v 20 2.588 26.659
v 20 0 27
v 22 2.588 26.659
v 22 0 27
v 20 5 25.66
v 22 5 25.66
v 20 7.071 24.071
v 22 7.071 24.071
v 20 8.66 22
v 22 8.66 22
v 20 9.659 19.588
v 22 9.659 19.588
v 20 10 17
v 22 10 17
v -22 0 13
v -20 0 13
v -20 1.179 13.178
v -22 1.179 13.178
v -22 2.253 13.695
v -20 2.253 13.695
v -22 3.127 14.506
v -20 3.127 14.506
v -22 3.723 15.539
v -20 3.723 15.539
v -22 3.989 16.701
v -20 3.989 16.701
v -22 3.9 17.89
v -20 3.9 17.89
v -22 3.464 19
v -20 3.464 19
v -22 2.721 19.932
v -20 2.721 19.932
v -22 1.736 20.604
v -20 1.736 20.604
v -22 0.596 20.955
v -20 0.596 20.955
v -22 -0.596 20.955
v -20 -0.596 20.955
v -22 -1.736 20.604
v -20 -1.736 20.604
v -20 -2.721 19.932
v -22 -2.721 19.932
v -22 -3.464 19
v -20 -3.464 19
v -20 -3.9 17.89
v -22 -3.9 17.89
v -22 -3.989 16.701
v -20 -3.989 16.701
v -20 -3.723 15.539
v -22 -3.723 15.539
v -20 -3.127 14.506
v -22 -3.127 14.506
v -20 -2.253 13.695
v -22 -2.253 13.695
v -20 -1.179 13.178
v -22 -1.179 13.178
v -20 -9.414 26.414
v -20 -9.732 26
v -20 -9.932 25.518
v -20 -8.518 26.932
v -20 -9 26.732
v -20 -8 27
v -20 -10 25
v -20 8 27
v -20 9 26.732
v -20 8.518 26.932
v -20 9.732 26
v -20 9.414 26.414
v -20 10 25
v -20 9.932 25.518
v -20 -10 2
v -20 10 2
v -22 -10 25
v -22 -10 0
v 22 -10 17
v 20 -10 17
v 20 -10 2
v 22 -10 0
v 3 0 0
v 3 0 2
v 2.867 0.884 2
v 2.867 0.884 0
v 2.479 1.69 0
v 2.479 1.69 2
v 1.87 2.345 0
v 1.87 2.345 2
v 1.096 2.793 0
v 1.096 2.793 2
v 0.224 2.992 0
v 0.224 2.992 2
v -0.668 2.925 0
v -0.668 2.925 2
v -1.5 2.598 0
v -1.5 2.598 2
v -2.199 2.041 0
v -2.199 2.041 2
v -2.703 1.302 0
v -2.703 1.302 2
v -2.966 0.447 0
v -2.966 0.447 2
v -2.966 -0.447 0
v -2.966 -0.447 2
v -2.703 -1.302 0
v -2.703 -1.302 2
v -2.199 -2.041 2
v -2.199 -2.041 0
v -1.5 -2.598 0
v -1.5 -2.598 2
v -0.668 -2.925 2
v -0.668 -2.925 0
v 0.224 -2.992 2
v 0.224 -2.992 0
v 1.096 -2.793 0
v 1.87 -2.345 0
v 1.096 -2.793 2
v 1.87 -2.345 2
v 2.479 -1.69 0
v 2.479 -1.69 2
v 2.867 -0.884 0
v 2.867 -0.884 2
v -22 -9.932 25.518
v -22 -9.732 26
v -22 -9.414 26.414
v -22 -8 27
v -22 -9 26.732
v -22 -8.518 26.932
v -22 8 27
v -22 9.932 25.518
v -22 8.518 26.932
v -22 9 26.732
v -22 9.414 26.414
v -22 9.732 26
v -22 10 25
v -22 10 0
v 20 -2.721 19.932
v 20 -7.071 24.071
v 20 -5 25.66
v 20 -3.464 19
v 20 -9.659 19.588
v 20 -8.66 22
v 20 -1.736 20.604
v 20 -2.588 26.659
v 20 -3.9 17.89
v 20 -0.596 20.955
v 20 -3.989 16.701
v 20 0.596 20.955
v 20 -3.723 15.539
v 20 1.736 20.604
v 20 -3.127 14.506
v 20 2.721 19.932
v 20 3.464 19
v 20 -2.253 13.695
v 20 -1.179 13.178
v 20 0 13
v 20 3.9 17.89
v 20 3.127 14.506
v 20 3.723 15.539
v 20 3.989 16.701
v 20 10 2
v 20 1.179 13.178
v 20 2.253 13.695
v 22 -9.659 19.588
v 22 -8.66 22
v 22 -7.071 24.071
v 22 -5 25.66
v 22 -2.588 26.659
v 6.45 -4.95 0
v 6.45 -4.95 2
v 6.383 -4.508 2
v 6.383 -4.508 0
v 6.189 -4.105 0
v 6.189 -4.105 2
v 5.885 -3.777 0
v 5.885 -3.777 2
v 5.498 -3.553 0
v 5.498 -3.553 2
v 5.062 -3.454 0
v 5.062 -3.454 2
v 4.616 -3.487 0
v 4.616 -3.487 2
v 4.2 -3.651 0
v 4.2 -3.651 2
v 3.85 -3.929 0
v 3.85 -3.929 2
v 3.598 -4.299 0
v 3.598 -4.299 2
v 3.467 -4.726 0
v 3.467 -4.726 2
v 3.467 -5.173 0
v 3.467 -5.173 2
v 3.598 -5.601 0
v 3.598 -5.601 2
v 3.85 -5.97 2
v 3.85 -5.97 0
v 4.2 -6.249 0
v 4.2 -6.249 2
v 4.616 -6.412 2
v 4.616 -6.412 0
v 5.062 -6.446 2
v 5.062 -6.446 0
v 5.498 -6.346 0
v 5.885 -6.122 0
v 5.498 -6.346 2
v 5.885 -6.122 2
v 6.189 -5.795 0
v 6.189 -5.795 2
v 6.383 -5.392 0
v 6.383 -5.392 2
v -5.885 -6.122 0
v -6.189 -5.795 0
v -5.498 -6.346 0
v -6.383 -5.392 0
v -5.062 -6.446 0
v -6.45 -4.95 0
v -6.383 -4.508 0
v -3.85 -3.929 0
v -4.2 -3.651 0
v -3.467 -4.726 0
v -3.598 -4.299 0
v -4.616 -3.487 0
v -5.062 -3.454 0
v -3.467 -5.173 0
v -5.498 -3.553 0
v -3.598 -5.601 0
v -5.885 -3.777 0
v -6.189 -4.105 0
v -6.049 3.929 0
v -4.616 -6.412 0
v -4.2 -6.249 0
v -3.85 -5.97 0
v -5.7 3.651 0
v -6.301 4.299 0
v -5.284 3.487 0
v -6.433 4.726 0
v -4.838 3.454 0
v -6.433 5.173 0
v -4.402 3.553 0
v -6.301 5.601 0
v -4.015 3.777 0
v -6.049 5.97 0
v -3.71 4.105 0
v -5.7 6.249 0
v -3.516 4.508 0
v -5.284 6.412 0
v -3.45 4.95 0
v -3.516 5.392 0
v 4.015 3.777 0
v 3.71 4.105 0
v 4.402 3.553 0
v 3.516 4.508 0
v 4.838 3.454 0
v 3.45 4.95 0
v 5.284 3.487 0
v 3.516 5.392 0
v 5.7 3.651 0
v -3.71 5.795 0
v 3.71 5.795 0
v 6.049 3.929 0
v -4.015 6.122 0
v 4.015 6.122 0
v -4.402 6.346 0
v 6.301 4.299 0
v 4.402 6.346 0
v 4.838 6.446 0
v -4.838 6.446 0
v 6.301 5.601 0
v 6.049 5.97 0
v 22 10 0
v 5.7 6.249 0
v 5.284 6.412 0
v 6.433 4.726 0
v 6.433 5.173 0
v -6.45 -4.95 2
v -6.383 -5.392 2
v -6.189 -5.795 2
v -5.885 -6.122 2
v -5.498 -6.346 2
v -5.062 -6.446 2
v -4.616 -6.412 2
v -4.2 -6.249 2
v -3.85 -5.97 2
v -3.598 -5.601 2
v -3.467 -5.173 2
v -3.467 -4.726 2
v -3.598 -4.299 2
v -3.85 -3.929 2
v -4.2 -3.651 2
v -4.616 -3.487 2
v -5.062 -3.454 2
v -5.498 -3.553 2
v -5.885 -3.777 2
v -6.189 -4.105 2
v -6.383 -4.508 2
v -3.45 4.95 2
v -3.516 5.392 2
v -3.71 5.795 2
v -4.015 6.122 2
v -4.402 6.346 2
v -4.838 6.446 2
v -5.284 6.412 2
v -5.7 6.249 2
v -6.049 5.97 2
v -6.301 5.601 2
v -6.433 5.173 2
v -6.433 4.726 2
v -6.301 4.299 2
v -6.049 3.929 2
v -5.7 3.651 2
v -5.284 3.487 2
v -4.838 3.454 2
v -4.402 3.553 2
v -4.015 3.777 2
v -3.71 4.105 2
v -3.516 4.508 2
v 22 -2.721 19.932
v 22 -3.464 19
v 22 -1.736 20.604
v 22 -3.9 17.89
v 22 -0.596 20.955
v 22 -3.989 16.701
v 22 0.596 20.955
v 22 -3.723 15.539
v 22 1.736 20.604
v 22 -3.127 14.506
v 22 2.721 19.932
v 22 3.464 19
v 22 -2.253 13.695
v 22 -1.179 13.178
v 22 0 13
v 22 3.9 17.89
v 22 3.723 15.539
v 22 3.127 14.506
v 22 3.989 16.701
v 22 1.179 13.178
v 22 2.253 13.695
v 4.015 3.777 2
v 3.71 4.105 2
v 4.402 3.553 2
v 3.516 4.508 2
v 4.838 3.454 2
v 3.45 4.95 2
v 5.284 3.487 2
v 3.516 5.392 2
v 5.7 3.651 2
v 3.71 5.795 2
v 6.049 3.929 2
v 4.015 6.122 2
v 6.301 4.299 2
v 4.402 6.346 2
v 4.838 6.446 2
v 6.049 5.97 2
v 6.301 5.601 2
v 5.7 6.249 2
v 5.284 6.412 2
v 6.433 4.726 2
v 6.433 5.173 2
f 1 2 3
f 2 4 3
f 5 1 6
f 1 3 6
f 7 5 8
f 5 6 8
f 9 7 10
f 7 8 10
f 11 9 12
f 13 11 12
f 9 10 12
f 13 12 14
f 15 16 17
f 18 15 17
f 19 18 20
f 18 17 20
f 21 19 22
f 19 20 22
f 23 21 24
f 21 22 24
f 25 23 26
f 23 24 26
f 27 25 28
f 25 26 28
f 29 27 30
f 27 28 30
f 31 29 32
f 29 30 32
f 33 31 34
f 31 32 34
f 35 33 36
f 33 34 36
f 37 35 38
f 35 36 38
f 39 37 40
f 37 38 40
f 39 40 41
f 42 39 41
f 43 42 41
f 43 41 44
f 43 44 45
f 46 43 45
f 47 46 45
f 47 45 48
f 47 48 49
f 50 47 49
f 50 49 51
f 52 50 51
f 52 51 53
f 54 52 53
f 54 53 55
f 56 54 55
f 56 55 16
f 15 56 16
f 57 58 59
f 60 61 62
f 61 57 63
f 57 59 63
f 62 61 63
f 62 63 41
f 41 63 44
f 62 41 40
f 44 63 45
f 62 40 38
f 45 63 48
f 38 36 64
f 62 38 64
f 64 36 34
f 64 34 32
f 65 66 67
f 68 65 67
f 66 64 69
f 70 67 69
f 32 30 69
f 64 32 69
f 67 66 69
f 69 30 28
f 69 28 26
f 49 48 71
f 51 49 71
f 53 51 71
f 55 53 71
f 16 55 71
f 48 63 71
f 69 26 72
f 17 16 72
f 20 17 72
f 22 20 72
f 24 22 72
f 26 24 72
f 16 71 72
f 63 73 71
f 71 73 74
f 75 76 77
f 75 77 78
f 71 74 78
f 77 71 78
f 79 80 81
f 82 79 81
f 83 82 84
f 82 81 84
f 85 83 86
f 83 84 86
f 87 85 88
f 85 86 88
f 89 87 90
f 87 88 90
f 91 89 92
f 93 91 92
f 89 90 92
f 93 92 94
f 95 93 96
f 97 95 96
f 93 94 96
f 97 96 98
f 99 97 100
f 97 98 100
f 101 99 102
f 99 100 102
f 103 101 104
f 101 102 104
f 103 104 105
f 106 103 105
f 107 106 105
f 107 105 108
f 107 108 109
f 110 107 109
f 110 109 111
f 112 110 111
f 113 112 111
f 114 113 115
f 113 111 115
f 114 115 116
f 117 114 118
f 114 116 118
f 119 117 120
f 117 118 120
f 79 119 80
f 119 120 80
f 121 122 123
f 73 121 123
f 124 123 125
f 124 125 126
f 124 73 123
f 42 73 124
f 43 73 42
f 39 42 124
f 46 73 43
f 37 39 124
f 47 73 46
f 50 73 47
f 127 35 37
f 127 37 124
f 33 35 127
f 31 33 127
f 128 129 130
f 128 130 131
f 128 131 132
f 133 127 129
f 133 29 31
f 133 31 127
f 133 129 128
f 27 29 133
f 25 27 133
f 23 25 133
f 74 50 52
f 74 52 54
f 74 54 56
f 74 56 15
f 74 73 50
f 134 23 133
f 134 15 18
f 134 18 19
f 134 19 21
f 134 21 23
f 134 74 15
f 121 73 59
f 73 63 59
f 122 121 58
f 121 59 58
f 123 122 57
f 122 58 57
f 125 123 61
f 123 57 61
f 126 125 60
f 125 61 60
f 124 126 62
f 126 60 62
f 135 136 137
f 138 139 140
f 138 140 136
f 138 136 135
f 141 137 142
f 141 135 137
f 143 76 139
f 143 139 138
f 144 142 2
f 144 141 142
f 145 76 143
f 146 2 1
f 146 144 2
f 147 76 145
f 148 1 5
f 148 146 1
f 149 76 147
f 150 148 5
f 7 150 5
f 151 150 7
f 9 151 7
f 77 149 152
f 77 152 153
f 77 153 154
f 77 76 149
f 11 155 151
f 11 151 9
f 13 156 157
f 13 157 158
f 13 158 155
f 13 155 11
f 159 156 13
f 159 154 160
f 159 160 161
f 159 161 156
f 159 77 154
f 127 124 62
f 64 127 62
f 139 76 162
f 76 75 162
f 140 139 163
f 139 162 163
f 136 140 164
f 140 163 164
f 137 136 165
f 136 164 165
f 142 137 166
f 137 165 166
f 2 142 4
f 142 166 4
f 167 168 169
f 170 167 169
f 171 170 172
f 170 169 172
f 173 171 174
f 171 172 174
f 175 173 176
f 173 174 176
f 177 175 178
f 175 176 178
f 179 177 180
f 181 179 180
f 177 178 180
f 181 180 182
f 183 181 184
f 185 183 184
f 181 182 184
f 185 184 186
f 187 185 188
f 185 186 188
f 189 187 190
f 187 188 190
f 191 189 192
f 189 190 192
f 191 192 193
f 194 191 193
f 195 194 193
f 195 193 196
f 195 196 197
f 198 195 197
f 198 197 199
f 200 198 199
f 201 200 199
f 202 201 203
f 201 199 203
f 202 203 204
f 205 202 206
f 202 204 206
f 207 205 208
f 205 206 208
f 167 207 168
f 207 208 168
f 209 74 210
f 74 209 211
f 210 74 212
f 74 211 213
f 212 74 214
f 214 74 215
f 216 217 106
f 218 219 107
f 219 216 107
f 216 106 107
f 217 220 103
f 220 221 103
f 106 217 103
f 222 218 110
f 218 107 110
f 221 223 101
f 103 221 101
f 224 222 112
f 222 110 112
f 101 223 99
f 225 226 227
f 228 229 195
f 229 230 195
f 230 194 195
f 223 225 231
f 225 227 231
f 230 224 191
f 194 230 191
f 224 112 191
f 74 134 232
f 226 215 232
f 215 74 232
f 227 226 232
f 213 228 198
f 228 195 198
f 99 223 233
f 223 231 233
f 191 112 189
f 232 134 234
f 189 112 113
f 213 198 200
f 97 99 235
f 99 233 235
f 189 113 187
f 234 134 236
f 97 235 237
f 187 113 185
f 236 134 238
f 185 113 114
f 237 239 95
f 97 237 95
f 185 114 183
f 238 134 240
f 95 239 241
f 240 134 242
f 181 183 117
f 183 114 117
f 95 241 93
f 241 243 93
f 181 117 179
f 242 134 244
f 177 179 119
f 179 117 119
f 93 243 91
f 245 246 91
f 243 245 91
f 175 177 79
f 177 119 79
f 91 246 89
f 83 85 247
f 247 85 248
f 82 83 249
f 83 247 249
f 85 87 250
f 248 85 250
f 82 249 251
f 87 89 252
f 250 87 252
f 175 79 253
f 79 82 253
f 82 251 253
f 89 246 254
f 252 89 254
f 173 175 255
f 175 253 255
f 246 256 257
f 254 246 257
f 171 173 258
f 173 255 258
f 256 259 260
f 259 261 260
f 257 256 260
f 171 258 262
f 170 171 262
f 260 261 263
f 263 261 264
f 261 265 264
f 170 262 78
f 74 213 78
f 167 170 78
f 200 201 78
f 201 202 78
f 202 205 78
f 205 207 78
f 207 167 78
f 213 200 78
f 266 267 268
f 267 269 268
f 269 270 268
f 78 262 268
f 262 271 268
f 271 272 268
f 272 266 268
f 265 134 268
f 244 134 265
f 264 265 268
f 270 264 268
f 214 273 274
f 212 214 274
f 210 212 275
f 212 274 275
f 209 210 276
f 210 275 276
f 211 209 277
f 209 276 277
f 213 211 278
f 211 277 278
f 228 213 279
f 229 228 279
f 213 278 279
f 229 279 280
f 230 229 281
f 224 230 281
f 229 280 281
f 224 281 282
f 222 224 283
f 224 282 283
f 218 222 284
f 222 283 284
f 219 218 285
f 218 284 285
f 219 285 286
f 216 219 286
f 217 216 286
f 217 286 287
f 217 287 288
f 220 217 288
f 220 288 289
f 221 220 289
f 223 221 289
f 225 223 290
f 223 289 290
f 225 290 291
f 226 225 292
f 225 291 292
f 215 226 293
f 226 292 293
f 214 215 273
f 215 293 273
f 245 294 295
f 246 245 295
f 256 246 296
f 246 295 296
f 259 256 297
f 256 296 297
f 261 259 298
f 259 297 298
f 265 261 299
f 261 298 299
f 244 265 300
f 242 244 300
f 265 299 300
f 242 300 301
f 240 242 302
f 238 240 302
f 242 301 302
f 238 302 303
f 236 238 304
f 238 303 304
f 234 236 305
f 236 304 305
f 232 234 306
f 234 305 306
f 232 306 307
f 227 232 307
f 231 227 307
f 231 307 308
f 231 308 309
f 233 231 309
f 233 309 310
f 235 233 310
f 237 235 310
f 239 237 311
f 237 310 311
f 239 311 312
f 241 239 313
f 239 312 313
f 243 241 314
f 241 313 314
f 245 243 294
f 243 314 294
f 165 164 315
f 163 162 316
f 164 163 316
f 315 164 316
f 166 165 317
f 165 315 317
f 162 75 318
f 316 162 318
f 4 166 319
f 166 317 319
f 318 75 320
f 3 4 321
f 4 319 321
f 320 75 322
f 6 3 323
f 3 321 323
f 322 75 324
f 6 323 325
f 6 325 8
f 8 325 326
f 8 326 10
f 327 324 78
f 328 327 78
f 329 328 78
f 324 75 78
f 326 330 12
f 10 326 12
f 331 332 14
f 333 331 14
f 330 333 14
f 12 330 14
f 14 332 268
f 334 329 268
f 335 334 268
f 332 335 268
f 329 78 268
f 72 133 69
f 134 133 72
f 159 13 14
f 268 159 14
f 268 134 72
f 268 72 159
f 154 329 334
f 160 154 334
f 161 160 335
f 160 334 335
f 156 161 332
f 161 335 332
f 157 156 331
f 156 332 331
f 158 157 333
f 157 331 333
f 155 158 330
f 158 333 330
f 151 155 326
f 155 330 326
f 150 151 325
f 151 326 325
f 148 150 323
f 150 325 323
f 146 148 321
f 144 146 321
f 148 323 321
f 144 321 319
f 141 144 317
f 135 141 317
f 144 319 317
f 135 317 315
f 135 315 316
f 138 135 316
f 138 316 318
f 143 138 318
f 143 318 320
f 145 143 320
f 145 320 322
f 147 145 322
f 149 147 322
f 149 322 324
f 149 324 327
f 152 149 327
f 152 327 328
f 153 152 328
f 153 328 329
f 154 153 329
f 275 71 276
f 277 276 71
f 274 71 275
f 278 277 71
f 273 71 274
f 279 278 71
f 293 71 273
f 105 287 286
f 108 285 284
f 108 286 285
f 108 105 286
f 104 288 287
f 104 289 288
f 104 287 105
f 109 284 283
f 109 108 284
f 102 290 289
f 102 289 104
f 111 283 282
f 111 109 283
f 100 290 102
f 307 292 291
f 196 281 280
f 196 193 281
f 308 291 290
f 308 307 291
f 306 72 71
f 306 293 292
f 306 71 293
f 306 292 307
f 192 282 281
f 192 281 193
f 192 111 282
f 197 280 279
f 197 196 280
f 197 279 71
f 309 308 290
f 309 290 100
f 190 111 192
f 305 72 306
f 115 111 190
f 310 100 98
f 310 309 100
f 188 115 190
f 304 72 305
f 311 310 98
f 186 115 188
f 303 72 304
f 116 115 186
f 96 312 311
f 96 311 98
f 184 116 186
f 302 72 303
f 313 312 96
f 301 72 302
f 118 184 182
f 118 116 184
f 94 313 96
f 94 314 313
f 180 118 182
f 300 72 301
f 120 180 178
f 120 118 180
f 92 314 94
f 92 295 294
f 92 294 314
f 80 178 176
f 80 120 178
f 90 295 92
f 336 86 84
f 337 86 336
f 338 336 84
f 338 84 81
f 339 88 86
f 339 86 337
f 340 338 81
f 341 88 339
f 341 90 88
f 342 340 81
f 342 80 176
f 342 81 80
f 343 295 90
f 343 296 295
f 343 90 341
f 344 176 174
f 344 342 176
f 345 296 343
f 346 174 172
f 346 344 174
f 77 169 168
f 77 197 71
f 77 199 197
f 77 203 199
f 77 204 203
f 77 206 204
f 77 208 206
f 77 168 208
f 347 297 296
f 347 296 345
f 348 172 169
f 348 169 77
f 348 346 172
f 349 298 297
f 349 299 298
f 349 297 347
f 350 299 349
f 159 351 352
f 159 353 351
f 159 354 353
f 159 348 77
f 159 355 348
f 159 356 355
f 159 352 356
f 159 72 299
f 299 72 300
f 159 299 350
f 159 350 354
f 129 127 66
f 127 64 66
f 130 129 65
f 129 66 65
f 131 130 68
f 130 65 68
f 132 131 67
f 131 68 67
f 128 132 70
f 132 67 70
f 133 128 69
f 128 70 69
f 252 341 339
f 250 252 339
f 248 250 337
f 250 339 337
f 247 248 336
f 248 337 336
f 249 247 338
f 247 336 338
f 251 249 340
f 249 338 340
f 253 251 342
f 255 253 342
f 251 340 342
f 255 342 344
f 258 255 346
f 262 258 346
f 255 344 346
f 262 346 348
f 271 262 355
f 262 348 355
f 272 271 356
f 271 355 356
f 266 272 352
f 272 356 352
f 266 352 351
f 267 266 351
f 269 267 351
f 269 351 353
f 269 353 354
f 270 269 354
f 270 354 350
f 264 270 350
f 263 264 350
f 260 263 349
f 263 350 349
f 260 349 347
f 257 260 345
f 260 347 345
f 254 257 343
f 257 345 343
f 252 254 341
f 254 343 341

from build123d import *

# Parameters (mm, degrees)
CROQUIS1_W              = 44
CROQUIS1_H              = 20
SALIENTE_EXTRUIR1_DEPTH = 2
CROQUIS2_R              = 3
CROQUIS2_R_2            = 1.5
CORTAR_EXTRUIR1_DEPTH   = 2
CROQUIS3_W              = 2
CROQUIS3_H              = 20
SALIENTE_EXTRUIR2_DEPTH = 25
REDONDEO1_R             = 10
REDONDEO2_R             = 2
CORTAR_EXTRUIR2_REACH   = 54.583
CROQUIS4_R              = 4


with BuildPart() as part:
    # Croquis1 → Saliente-Extruir1 (new body)
    with BuildSketch(Plane.XY):
        Rectangle(CROQUIS1_W, CROQUIS1_H)
    extrude(amount=SALIENTE_EXTRUIR1_DEPTH)

    # Croquis2 → Cortar-Extruir1 (cut)
    with BuildSketch(Plane.XY.offset(2)):
        Circle(CROQUIS2_R)
        with Locations((-4.949747468, 4.949747468)):
            Circle(CROQUIS2_R_2)
        with Locations(Location((4.949747468, 4.949747468, 0), (0, 0, 180))):
            Circle(CROQUIS2_R_2)
        with Locations((4.949747468, -4.949747468)):
            Circle(CROQUIS2_R_2)
        with Locations(Location((-4.949747468, -4.949747468, 0), (0, 0, 180))):
            Circle(CROQUIS2_R_2)
    extrude(amount=-CORTAR_EXTRUIR1_DEPTH, mode=Mode.SUBTRACT)

    # Croquis3 → Saliente-Extruir2 (add)
    with BuildSketch(Plane.XY.offset(2)):
        with Locations((-21, 0)):
            Rectangle(CROQUIS3_W, CROQUIS3_H)
        with Locations((21, 0)):
            Rectangle(CROQUIS3_W, CROQUIS3_H)
    extrude(amount=SALIENTE_EXTRUIR2_DEPTH)

    # Redondeo1
    redondeo1_edges = [part.edges().sort_by_distance(p)[0] for p in [
        (21, 10, 27),
        (21, -10, 27),
    ]]
    fillet(redondeo1_edges, radius=REDONDEO1_R - 0.0001)  # a hair under: the kernel refuses the full size

    # Redondeo2
    redondeo2_edges = [part.edges().sort_by_distance(p)[0] for p in [
        (-21, -10, 27),
        (-21, 10, 27),
    ]]
    fillet(redondeo2_edges, radius=REDONDEO2_R)

    # Cortar-Extruir2: up to this face of the body (flat: up to its plane)
    cortar_extruir2_end = Plane(part.part.faces().sort_by_distance((-22, 0, 13.458367573))[0])
    # Croquis4 → Cortar-Extruir2 (cut, up to the picked face)
    with BuildSketch(Plane(origin=(22, 0, 0), x_dir=(0, 0, -1), z_dir=(1, 0, 0)), mode=Mode.PRIVATE) as cortar_extruir2_sk1:
        with Locations((-17, 0)):
            Circle(CROQUIS4_R)
    cortar_extruir2_tool1 = split(extrude(cortar_extruir2_sk1.sketch, amount=-CORTAR_EXTRUIR2_REACH, mode=Mode.PRIVATE), bisect_by=cortar_extruir2_end, keep=Keep.BOTH, mode=Mode.PRIVATE)
    add(cortar_extruir2_tool1.solids().sort_by(Axis((22, 0, 17), (-1, 0, 0)))[0], mode=Mode.SUBTRACT)


solid = part.part
